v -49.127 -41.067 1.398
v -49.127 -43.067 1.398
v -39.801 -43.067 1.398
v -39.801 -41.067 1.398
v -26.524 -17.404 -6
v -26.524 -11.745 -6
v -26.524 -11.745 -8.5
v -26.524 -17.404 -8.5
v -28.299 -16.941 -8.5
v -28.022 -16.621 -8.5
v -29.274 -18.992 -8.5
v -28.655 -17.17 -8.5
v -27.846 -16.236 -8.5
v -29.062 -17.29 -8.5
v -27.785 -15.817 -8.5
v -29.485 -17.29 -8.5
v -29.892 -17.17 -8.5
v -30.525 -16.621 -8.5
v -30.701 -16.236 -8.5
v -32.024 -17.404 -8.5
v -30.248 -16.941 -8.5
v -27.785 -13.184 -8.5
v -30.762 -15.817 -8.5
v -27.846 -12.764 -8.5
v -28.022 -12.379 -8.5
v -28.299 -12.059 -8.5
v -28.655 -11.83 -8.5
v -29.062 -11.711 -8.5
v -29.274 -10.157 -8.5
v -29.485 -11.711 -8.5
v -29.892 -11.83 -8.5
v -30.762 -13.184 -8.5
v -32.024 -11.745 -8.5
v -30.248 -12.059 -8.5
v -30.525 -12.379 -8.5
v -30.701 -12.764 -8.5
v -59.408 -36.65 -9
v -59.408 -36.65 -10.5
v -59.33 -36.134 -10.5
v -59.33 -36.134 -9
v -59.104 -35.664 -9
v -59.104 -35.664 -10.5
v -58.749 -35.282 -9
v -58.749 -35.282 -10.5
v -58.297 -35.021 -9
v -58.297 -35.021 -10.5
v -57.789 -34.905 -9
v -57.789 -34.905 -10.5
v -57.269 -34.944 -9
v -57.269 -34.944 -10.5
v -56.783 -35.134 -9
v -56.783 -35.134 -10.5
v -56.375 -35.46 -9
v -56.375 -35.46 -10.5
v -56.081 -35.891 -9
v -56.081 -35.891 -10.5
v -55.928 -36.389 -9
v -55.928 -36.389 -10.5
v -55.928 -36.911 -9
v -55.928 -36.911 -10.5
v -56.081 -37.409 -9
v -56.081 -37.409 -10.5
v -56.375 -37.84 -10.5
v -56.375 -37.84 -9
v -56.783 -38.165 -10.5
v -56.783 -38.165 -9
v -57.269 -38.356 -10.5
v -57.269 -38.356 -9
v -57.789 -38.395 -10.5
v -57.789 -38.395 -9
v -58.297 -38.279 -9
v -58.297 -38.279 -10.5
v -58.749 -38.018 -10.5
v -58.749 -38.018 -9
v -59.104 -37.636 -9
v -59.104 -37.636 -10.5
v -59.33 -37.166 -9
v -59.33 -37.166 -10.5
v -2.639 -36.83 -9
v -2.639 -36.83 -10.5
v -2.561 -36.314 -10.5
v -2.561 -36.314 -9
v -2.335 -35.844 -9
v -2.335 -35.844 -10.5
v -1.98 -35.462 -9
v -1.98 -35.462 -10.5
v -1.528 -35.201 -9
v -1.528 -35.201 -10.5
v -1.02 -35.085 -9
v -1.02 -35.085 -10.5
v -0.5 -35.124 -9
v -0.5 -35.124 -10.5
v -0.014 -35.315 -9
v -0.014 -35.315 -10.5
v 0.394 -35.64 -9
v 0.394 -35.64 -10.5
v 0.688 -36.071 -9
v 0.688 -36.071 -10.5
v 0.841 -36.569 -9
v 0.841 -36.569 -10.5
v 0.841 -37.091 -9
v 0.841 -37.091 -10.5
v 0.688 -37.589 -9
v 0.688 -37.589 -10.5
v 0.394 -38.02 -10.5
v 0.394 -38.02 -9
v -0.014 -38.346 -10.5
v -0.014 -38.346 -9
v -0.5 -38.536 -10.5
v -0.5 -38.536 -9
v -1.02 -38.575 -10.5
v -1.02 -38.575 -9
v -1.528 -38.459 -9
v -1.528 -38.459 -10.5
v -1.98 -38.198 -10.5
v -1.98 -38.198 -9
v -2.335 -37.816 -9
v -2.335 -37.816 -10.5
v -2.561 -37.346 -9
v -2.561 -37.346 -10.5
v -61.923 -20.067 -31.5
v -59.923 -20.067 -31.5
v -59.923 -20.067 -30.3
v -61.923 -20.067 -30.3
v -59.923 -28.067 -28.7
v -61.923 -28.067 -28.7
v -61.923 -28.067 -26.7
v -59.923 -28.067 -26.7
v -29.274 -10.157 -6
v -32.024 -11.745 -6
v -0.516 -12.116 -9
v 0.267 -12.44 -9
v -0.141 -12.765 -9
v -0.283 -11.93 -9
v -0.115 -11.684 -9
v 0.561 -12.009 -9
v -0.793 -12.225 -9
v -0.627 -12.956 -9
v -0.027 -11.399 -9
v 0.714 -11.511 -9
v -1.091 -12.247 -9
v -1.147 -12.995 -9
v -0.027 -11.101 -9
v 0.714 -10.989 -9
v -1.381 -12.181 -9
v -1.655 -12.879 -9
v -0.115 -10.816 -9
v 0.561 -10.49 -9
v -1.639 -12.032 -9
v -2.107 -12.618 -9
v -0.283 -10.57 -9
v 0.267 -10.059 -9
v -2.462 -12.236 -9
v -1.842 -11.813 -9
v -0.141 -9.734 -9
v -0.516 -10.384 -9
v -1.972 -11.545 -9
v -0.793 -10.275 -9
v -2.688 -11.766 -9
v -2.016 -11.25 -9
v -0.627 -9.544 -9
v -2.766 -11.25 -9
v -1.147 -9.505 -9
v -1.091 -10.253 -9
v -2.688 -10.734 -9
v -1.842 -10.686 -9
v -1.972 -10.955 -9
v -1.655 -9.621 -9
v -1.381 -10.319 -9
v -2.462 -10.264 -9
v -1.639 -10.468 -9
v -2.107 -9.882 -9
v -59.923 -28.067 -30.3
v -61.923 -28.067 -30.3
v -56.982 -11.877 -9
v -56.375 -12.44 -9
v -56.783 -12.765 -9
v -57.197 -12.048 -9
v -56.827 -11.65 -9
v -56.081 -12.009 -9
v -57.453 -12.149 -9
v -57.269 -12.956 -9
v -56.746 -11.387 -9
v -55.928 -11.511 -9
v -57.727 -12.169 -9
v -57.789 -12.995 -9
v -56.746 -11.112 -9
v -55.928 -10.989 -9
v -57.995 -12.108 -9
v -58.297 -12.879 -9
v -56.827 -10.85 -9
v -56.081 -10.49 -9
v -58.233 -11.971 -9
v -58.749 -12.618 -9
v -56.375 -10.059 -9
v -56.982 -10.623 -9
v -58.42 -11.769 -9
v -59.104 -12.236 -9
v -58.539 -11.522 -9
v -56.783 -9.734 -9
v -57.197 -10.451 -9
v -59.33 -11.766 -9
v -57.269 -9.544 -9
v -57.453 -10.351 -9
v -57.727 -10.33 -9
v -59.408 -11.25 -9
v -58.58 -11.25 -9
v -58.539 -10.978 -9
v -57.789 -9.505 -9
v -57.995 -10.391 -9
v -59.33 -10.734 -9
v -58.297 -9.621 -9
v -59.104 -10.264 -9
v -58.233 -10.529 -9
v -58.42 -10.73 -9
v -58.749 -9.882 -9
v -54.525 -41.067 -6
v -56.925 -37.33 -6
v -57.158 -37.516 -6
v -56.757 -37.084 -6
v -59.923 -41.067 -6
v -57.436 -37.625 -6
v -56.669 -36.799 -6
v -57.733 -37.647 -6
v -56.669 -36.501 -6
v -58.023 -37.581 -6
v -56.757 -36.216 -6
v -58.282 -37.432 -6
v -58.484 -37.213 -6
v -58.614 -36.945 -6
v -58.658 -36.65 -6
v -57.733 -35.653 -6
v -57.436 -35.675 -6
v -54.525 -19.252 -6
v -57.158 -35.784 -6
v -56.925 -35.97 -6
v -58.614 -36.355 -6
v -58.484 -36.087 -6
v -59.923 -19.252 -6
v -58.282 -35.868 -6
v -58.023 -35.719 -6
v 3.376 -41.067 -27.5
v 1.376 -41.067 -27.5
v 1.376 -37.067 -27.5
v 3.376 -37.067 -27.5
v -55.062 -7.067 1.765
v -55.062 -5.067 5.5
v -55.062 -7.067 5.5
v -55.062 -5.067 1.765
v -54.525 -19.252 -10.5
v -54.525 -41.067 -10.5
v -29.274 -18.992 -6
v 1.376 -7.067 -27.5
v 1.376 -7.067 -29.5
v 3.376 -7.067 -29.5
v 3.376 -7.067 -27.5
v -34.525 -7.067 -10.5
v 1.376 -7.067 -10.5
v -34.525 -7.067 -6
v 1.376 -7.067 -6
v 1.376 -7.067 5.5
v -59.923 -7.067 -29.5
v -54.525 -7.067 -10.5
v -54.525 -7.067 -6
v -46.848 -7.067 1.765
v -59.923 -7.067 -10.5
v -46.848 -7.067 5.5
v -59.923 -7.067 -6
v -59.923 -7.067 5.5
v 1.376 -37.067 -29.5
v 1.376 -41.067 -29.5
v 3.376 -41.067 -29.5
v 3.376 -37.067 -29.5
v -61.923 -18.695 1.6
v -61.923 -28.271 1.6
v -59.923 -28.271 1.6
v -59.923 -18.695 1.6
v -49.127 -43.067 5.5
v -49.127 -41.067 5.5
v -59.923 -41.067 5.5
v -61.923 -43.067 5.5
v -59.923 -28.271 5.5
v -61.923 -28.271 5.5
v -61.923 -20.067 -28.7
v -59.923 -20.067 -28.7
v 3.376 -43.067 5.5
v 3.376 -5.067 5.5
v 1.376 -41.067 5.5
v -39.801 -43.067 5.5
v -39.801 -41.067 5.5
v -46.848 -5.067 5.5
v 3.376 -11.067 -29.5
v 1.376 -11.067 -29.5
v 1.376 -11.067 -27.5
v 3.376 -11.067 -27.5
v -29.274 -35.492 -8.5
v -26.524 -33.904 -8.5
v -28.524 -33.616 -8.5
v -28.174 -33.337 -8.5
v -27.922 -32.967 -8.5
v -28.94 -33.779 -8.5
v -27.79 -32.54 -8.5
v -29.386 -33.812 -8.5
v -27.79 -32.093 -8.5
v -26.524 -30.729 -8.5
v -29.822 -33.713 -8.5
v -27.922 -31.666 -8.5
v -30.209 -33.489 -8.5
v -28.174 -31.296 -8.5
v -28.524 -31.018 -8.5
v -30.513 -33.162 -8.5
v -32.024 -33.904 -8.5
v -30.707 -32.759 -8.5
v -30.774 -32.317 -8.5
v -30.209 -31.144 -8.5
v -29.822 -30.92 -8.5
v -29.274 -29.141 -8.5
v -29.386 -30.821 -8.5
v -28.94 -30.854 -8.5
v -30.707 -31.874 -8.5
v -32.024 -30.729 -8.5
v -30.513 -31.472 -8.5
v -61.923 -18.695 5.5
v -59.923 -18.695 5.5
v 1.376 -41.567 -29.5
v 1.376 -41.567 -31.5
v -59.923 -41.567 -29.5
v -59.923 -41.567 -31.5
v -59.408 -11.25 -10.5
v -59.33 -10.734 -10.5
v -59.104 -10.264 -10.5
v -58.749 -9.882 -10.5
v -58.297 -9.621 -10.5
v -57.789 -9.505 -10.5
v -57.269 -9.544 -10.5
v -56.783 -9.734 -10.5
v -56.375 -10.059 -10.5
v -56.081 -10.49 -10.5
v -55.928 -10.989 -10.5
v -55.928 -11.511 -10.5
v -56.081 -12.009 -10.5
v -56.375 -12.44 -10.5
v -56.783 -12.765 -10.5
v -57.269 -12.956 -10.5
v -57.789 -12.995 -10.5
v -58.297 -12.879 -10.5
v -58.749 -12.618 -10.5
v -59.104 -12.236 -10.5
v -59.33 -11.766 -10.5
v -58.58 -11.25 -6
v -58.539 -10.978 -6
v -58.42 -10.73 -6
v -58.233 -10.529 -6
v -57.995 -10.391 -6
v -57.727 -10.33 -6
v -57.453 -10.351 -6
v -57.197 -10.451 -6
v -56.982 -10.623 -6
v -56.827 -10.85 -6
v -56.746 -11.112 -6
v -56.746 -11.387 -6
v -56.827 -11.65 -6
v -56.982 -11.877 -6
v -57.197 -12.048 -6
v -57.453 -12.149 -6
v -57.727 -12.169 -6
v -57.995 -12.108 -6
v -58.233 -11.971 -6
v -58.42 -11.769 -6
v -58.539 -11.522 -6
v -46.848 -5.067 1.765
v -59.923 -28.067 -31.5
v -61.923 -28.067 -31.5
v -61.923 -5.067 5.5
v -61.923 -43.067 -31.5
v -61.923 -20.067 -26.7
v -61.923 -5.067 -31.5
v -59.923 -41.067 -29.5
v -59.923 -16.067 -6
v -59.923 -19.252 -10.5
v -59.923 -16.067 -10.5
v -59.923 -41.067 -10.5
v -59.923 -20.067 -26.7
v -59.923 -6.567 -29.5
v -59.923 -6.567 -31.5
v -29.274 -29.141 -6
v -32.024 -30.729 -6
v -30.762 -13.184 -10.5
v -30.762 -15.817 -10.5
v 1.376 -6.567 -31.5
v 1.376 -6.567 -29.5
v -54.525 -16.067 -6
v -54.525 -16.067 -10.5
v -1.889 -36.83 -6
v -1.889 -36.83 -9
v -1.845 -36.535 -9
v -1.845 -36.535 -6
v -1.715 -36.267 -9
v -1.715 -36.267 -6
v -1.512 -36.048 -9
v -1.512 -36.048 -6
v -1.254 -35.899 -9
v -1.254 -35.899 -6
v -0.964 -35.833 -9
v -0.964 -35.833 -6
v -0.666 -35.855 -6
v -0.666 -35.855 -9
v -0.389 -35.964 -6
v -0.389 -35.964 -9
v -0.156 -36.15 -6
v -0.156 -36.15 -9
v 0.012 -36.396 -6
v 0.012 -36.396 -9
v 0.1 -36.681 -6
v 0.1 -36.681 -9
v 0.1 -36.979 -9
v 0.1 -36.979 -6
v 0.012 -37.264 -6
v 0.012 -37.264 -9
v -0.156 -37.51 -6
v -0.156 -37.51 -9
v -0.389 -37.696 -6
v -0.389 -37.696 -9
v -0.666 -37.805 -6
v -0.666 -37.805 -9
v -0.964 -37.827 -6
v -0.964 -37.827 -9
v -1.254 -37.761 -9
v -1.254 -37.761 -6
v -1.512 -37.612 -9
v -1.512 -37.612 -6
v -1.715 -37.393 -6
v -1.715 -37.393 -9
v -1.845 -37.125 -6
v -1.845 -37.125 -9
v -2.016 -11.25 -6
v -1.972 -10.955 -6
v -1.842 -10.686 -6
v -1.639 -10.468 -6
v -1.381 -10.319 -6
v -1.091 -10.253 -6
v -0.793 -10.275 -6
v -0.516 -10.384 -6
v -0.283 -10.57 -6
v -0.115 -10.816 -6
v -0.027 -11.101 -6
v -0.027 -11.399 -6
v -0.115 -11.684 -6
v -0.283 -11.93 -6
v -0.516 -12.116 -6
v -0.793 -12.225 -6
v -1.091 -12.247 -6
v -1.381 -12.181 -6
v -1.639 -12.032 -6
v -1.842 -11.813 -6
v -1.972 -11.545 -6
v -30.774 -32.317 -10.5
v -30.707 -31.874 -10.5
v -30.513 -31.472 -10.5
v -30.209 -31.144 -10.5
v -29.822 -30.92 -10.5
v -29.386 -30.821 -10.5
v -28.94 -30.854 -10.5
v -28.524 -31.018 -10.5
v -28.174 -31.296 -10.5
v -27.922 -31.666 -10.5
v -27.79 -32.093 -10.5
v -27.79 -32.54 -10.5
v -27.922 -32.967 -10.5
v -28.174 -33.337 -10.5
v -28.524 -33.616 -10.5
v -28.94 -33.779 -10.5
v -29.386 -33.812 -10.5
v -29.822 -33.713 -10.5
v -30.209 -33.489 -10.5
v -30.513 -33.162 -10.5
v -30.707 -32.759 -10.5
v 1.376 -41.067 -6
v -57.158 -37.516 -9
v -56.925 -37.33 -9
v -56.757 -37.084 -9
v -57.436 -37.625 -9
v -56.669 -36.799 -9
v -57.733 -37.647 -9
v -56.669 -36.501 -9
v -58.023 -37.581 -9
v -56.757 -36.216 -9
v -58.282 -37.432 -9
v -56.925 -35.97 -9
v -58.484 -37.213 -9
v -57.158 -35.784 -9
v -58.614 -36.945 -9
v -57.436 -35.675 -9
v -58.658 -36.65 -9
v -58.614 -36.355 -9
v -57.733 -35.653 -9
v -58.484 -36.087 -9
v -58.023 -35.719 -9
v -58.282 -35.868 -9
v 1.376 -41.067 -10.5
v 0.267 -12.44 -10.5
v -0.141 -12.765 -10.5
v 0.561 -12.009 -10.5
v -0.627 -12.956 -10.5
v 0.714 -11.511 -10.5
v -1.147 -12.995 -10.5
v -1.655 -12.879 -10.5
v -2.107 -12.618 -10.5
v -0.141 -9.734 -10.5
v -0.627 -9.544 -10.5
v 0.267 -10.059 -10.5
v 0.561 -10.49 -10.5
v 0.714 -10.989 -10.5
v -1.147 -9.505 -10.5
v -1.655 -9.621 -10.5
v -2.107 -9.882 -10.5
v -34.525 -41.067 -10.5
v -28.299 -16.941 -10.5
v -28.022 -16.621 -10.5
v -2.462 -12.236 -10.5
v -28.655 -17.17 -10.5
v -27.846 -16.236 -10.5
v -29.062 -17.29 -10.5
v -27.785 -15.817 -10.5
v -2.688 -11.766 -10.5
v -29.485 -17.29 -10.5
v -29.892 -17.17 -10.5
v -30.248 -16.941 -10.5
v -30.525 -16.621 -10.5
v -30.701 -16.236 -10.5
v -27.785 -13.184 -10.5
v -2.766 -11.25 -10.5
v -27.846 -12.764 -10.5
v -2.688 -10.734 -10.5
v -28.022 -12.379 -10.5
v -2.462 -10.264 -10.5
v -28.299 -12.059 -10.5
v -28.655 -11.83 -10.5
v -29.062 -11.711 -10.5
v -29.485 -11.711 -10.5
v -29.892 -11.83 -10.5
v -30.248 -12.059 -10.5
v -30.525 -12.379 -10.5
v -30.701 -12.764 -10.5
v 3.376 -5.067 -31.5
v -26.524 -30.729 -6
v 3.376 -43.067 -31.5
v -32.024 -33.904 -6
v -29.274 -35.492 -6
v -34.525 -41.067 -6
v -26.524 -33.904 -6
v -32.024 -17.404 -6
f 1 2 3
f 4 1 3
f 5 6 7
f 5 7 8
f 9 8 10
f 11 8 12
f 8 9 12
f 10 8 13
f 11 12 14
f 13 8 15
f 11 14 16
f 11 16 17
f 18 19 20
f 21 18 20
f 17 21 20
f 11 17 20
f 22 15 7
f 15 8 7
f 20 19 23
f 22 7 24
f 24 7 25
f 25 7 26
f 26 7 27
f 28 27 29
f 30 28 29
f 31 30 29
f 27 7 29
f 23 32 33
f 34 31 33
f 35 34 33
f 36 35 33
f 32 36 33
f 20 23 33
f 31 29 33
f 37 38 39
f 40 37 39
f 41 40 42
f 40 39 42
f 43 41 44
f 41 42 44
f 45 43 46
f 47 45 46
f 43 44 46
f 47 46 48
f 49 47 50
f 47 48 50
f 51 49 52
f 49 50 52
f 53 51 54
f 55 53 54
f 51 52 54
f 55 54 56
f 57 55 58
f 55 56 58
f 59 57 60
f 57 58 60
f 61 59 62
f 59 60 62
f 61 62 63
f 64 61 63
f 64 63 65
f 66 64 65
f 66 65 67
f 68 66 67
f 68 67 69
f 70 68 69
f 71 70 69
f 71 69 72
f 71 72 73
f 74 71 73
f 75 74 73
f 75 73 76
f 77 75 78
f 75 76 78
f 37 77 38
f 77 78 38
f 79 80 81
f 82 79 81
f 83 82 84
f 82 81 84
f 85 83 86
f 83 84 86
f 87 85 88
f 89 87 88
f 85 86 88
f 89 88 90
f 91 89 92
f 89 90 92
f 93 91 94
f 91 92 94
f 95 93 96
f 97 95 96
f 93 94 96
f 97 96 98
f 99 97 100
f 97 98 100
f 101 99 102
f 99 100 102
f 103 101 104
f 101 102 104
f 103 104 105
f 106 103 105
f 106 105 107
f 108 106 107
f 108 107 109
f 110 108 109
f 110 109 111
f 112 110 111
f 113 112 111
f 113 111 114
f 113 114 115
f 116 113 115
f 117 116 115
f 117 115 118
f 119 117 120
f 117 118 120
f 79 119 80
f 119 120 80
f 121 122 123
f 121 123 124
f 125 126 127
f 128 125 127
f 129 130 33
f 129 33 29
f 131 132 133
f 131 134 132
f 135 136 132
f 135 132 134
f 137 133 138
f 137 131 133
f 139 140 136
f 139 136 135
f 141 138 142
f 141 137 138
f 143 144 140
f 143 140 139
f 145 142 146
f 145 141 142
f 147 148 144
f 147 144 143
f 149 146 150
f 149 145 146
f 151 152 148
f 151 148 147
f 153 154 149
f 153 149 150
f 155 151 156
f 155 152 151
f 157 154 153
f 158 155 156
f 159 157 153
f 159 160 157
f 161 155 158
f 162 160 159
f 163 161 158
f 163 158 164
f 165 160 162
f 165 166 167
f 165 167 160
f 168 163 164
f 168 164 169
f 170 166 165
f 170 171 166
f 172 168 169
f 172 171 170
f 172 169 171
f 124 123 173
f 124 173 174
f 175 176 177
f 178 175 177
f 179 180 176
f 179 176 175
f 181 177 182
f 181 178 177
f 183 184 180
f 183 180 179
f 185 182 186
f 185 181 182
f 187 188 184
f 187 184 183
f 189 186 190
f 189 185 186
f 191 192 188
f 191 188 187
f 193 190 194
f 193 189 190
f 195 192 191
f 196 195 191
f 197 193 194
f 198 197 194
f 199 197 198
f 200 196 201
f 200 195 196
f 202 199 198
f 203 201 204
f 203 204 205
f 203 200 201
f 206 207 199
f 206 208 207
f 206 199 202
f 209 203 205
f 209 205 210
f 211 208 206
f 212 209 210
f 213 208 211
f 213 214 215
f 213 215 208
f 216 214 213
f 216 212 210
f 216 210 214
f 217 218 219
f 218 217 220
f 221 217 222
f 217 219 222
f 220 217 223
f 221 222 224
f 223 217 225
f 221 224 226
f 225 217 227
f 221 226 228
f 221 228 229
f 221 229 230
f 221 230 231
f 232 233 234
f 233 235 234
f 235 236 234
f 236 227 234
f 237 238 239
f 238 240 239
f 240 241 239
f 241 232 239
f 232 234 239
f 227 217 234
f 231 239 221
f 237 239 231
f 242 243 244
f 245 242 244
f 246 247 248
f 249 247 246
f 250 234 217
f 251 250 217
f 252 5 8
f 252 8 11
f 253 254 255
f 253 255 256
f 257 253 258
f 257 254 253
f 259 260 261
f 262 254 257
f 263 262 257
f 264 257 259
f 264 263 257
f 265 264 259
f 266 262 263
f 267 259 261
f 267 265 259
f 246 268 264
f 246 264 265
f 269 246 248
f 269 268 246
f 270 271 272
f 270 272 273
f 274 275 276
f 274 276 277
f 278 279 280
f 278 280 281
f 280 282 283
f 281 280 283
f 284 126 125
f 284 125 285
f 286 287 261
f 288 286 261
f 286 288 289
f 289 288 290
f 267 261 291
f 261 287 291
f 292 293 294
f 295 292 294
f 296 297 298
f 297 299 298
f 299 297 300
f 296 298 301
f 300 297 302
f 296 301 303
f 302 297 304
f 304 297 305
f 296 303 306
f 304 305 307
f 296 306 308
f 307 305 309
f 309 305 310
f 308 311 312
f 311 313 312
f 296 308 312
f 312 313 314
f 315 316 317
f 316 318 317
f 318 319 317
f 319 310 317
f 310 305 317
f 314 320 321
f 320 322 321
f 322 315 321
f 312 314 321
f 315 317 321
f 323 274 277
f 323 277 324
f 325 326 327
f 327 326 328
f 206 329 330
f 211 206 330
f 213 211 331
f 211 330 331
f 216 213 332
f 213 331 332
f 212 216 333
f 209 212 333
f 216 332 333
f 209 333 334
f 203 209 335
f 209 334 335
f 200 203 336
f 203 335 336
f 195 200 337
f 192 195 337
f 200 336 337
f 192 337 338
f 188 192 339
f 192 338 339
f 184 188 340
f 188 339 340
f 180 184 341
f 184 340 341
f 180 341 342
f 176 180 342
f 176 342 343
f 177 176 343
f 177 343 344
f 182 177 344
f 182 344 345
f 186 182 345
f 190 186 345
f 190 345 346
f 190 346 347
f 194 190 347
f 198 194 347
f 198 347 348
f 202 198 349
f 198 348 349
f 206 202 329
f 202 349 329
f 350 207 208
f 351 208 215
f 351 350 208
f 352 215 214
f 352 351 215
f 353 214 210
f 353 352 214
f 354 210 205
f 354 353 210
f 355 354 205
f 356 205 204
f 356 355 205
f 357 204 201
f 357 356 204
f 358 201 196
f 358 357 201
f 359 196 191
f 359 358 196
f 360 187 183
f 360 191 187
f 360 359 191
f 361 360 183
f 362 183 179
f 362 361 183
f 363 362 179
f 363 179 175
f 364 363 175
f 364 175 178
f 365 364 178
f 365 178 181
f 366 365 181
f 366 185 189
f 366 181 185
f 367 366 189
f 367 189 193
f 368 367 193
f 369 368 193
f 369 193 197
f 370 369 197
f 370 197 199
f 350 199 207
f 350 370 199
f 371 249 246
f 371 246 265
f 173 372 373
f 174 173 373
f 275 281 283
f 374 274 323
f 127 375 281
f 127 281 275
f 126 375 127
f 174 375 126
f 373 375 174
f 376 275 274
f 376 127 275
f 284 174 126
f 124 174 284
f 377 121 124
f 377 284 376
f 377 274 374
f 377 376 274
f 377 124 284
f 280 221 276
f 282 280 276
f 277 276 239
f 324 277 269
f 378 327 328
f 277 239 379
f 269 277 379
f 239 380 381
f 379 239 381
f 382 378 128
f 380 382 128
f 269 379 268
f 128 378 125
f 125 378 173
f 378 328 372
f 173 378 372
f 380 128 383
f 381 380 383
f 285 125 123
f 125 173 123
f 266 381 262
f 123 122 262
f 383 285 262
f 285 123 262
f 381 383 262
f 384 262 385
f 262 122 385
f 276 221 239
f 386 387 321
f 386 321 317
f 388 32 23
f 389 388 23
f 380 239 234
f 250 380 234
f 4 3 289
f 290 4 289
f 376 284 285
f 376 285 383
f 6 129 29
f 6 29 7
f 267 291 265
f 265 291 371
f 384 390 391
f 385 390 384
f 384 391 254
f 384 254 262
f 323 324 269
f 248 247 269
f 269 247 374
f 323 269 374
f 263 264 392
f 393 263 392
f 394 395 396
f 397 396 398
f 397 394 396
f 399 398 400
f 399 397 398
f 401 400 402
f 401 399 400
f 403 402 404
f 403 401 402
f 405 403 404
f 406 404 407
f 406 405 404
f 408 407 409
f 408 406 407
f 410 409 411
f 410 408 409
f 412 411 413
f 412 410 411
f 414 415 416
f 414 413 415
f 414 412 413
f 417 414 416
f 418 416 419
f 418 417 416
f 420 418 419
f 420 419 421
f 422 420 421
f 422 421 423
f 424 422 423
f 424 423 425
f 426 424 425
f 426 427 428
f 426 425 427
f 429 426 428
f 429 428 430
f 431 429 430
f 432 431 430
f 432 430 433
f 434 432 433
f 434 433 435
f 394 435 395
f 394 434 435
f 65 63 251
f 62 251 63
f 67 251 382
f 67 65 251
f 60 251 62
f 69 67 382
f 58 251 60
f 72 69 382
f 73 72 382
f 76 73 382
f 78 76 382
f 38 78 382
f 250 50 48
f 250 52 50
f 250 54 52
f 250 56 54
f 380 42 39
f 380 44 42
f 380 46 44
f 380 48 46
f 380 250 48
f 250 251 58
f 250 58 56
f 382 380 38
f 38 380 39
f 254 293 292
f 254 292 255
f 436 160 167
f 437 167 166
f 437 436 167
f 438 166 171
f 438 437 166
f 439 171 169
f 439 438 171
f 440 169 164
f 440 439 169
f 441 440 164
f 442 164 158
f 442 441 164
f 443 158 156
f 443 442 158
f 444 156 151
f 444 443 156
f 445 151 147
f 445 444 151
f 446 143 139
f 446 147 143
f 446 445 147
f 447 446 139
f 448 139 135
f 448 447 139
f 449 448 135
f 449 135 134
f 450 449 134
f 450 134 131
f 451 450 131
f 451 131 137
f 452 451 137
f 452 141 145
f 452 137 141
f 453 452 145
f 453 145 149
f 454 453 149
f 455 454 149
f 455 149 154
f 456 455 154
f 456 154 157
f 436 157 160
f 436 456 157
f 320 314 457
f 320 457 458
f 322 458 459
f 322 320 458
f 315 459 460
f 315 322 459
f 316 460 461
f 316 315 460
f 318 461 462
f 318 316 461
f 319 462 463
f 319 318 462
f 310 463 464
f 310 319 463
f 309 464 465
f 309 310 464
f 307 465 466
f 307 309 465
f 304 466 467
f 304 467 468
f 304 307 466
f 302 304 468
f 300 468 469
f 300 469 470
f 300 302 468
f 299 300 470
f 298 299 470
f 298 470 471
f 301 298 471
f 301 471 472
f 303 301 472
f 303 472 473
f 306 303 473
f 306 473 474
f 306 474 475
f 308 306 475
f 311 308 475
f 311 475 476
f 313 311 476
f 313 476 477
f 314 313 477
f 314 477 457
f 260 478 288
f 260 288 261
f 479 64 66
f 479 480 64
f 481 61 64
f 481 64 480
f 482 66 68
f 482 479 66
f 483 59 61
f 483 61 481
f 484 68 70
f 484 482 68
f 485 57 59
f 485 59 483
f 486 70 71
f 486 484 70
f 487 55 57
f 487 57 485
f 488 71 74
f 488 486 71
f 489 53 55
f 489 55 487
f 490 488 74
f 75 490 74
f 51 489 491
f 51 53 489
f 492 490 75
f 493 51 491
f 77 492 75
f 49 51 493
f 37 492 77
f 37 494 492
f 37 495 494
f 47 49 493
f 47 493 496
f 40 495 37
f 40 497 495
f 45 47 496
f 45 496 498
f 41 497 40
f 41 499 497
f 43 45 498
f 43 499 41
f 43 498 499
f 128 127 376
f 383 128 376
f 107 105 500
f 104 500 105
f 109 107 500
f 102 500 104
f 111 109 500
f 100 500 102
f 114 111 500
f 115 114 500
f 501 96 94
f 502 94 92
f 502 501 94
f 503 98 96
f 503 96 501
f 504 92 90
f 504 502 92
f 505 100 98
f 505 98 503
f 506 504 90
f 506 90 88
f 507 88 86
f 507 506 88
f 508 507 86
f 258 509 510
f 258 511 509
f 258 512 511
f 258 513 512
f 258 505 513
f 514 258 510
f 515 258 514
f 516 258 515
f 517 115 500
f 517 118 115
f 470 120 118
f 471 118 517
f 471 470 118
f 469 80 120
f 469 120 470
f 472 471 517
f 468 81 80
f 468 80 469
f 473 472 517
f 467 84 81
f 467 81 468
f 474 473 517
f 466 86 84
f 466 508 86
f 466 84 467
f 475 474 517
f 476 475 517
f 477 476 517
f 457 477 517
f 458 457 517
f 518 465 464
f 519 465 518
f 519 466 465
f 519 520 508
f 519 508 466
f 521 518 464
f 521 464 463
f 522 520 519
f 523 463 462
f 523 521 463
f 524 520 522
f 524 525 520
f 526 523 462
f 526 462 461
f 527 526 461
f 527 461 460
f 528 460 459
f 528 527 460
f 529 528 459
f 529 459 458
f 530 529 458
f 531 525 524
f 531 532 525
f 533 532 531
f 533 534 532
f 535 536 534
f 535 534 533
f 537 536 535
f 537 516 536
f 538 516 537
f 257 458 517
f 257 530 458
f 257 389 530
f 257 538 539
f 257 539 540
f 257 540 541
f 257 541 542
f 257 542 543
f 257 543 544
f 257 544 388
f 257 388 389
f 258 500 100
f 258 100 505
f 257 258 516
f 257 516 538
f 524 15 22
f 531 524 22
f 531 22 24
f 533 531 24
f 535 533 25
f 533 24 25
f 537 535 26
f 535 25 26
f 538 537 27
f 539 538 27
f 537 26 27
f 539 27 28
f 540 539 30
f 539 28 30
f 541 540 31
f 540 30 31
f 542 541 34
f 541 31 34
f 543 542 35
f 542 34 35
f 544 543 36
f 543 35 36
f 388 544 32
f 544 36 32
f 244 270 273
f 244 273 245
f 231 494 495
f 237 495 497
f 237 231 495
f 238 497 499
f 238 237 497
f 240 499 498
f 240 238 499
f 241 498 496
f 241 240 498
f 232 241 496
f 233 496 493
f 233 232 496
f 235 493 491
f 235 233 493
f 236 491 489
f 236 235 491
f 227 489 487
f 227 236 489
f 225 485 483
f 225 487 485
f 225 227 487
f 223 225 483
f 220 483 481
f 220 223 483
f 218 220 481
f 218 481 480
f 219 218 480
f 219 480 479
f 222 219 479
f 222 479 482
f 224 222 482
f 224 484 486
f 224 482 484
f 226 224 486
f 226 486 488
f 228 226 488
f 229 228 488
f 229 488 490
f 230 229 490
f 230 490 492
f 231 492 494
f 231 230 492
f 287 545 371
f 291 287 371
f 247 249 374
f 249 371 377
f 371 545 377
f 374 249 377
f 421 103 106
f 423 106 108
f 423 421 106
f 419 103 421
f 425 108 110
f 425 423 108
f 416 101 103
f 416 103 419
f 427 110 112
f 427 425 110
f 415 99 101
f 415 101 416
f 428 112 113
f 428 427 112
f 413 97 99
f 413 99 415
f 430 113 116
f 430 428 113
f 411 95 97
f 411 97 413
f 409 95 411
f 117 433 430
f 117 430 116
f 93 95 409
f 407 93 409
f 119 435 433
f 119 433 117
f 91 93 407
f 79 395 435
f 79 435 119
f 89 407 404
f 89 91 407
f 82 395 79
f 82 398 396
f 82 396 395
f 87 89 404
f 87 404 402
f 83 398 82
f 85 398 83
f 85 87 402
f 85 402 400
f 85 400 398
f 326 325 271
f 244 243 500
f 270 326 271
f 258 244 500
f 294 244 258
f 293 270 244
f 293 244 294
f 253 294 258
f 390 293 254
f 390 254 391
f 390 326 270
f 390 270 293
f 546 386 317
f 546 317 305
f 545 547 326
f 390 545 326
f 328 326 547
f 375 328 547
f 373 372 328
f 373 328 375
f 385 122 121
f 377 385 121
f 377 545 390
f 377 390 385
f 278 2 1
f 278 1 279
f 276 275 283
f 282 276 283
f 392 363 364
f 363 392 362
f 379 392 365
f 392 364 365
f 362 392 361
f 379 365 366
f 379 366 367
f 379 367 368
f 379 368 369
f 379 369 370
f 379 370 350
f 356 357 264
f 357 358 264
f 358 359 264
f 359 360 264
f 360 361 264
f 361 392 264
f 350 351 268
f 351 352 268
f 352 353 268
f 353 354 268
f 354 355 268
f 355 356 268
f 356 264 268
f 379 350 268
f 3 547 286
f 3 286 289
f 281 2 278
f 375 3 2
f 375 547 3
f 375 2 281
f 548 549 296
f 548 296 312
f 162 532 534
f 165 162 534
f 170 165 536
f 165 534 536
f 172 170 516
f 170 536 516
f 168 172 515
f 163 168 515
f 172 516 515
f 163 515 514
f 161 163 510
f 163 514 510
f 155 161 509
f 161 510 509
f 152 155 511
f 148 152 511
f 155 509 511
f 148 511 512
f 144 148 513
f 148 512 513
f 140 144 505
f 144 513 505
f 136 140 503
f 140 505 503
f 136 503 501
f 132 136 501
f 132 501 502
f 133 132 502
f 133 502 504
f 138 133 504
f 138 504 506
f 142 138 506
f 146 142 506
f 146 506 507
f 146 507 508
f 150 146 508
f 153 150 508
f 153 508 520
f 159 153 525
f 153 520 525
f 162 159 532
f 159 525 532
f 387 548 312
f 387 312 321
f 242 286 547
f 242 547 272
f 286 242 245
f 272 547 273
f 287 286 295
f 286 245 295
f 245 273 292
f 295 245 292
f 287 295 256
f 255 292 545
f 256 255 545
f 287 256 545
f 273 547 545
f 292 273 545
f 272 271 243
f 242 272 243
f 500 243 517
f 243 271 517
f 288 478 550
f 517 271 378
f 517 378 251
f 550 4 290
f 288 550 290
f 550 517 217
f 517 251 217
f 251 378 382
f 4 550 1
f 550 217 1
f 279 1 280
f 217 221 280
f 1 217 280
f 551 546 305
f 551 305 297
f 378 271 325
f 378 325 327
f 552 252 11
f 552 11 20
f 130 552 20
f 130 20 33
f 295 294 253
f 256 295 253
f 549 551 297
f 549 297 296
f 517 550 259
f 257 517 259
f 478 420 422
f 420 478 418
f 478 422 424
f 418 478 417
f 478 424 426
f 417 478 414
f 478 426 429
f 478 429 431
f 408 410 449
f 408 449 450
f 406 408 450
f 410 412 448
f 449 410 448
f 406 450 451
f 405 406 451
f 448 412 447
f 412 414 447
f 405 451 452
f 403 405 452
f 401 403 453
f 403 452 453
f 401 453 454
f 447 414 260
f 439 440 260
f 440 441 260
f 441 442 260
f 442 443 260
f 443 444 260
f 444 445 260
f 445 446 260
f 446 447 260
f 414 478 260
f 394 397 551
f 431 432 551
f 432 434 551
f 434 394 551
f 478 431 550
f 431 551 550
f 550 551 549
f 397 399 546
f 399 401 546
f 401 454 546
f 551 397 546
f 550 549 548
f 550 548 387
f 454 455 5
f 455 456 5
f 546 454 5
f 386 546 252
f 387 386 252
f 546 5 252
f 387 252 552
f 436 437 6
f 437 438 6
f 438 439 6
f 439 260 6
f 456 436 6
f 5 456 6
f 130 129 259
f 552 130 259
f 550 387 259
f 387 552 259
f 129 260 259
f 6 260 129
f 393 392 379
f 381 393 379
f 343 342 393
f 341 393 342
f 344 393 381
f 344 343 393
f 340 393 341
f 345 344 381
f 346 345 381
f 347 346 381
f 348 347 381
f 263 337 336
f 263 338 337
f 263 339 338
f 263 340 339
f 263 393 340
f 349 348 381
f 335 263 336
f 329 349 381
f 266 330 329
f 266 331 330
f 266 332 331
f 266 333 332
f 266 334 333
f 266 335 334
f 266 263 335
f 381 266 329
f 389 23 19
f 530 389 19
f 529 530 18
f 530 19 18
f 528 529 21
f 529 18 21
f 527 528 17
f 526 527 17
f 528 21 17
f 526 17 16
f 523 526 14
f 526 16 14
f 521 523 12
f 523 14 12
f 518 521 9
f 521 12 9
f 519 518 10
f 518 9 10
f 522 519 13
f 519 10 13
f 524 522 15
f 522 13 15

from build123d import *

# Parameters (mm, degrees)
SKETCH_2_W           = 65.2997206
SKETCH_2_H           = 38
SKETCH_2_R           = 1.00000254
SKETCH_2_R_2         = 0.922218434
SKETCH_2_R_3         = 1.5
EXTRUDE_2_DEPTH      = 4.5
SKETCH_3_R           = 1.5
CUT_EXTRUDE_2_DEPTH  = 2.5
SKETCH_5_W           = 65.2997206
SKETCH_5_H           = 38
SKETCH_5_W_2         = 61.2997206
SKETCH_5_H_2         = 34
EXTRUDE_3_DEPTH      = 21
EXTRUDE_3_DEPTH_BACK = 16
SKETCH_7_W           = 8.214112973
SKETCH_7_H           = 3.795011114
CUT_EXTRUDE_4_DEPTH  = 3
SKETCH_8_W           = 4
SKETCH_8_H           = 9.575559499
CUT_EXTRUDE_5_DEPTH  = 3
SKETCH_9_W           = 9.326303795
SKETCH_9_H           = 4.202278939
CUT_EXTRUDE_6_DEPTH  = 3
CUT_EXTRUDE_7_DEPTH  = 10
SKETCH_15_R          = 1.75
CUT_EXTRUDE_8_DEPTH  = 1.5
SKETCH_18_W          = 61.2997206
SKETCH_18_H          = 35
CUT_EXTRUDE_9_DEPTH  = 2
SKETCH_19_W          = 2
SKETCH_19_H          = 4
CUT_EXTRUDE_10_DEPTH = 2
SKETCH_20_W          = 2
SKETCH_20_H          = 8
CUT_EXTRUDE_11_DEPTH = 1.2
SKETCH_21_W          = 2
SKETCH_21_H          = 8
CUT_EXTRUDE_12_DEPTH = 2


with BuildPart() as part:
    # 草图2 → 凸台-拉伸2 (new body)
    with BuildSketch(Plane(origin=(0, 0, -6), x_dir=(-1, 0, 0), z_dir=(0, 0, -1))):
        with Locations((29.273558547, -24.066548133)):
            Rectangle(SKETCH_2_W, SKETCH_2_H)
        with Locations((1.016002032, -11.24978156)):
            Circle(SKETCH_2_R, mode=Mode.SUBTRACT)
        with Locations((0.889001778, -36.83007366)):
            Circle(SKETCH_2_R, mode=Mode.SUBTRACT)
        with Locations((57.658115316, -36.64983236)):
            Circle(SKETCH_2_R, mode=Mode.SUBTRACT)
        with Locations((57.658115316, -11.24978156)):
            Circle(SKETCH_2_R_2, mode=Mode.SUBTRACT)
        with Locations((29.273558547, -32.316548133)):
            Circle(SKETCH_2_R_3, mode=Mode.SUBTRACT)
        with BuildLine():
            Line((27.785407033, -15.816548133), (27.785407033, -13.183619987))
            ThreePointArc((27.785407033, -13.183619987), (29.273558547, -11.695468472), (30.761710061, -13.183619987))
            Line((30.761710061, -13.183619987), (30.761710061, -15.816548133))
            ThreePointArc((30.761710061, -15.816548133), (29.273558547, -17.304699647), (27.785407033, -15.816548133))
        make_face(mode=Mode.SUBTRACT)
    extrude(amount=EXTRUDE_2_DEPTH)

    # 草图3 → 切除-拉伸2 (cut)
    with BuildSketch(Plane(origin=(0, 0, -6), x_dir=(-1, 0, 0), z_dir=(0, 0, -1))):
        Polygon((29.273558547, -18.991974614), (32.023558547, -17.404261373), (32.023558547, -14.920341582), (32.023558547, -14.228834893), (32.023558547, -11.744915102), (29.273558547, -10.157201862), (26.523558547, -11.744915102), (26.523558547, -14.228834893), (26.523558547, -14.920341582), (26.523558547, -17.404261373), align=None)
        with BuildLine():
            ThreePointArc((30.761710061, -15.816548133), (29.273558547, -17.304699647), (27.785407033, -15.816548133))
            Line((27.785407033, -15.816548133), (27.785407033, -13.183619987))
            ThreePointArc((27.785407033, -13.183619987), (29.273558547, -11.695468472), (30.761710061, -13.183619987))
            Line((30.761710061, -13.183619987), (30.761710061, -15.816548133))
        make_face(mode=Mode.SUBTRACT)
        Polygon((26.523558547, -30.728834893), (26.523558547, -33.904261373), (29.273558547, -35.491974614), (32.023558547, -33.904261373), (32.023558547, -30.728834893), (29.273558547, -29.141121653), align=None)
        with Locations((29.273558547, -32.316548133)):
            Circle(SKETCH_3_R, mode=Mode.SUBTRACT)
    extrude(amount=CUT_EXTRUDE_2_DEPTH, mode=Mode.SUBTRACT)

    # 草图5 → 凸台-拉伸3 (add, two sides)
    with BuildSketch(Plane(origin=(0, 0, -10.5), x_dir=(-1, 0, 0), z_dir=(0, 0, -1))) as extrude_3_sk:
        with Locations((29.273558547, -24.066548133)):
            Rectangle(SKETCH_5_W, SKETCH_5_H)
        with Locations((29.273558547, -24.066548133)):
            Rectangle(SKETCH_5_W_2, SKETCH_5_H_2, mode=Mode.SUBTRACT)
    extrude(amount=EXTRUDE_3_DEPTH)
    extrude(extrude_3_sk.sketch, amount=-EXTRUDE_3_DEPTH_BACK)

    # 草图7 → 切除-拉伸4 (cut)
    with BuildSketch(Plane(origin=(0, -5.066548133, 0), x_dir=(1, 0, 0), z_dir=(0, 1, 0))):
        with Locations((-50.955145133, -3.662545243)):
            Rectangle(SKETCH_7_W, SKETCH_7_H)
    extrude(amount=-CUT_EXTRUDE_4_DEPTH, mode=Mode.SUBTRACT)

    # 草图8 → 切除-拉伸5 (cut)
    with BuildSketch(Plane.ZY.offset(61.923418847)):
        with Locations((3.6000508, -23.483057223)):
            Rectangle(SKETCH_8_W, SKETCH_8_H)
    extrude(amount=-CUT_EXTRUDE_5_DEPTH, mode=Mode.SUBTRACT)

    # 草图9 → 切除-拉伸6 (cut)
    with BuildSketch(Plane.XZ.offset(43.066548133)):
        with Locations((-44.464129124, 3.49891133)):
            Rectangle(SKETCH_9_W, SKETCH_9_H)
    extrude(amount=-CUT_EXTRUDE_6_DEPTH, mode=Mode.SUBTRACT)

    # 草图13 → 切除-拉伸7 (cut)
    with BuildSketch(Plane.XY.offset(-6)):
        Polygon((-59.923418847, -16.066514367), (-59.923418847, -19.252115931), (-54.525349934, -19.252115931), (-54.525349934, -41.066548133), (-34.525349934, -41.066548133), (-34.525349934, -7.066548133), (-54.525349934, -7.066548133), (-54.525349934, -12.880912803), (-54.525349934, -16.066514367), align=None)
    extrude(amount=-CUT_EXTRUDE_7_DEPTH, mode=Mode.SUBTRACT)

    # 草图15 → 切除-拉伸8 (cut)
    with BuildSketch(Plane(origin=(0, 0, -10.5), x_dir=(-1, 0, 0), z_dir=(0, 0, -1))):
        with Locations((1.016002032, -11.24978156)):
            Circle(SKETCH_15_R)
        with Locations((57.658115316, -11.24978156)):
            Circle(SKETCH_15_R)
        with Locations((0.889001778, -36.83007366)):
            Circle(SKETCH_15_R)
        with Locations((57.658115316, -36.64983236)):
            Circle(SKETCH_15_R)
    extrude(amount=-CUT_EXTRUDE_8_DEPTH, mode=Mode.SUBTRACT)

    # 草图18 → 切除-拉伸9 (cut)
    with BuildSketch(Plane(origin=(0, 0, -31.5), x_dir=(-1, 0, 0), z_dir=(0, 0, -1))):
        with Locations((29.273558547, -24.066548133)):
            Rectangle(SKETCH_18_W, SKETCH_18_H)
    extrude(amount=-CUT_EXTRUDE_9_DEPTH, mode=Mode.SUBTRACT)

    # 草图19 → 切除-拉伸10 (cut)
    with BuildSketch(Plane.ZY.offset(-1.376301753)):
        with Locations((-28.5, -9.066548133)):
            Rectangle(SKETCH_19_W, SKETCH_19_H)
        with Locations((-28.5, -39.066548133)):
            Rectangle(SKETCH_19_W, SKETCH_19_H)
    extrude(amount=-CUT_EXTRUDE_10_DEPTH, mode=Mode.SUBTRACT)

    # 草图20 → 切除-拉伸11 (cut)
    with BuildSketch(Plane(origin=(0, 0, -31.5), x_dir=(-1, 0, 0), z_dir=(0, 0, -1))):
        with Locations((60.923418847, -24.066548133)):
            Rectangle(SKETCH_20_W, SKETCH_20_H)
    extrude(amount=-CUT_EXTRUDE_11_DEPTH, mode=Mode.SUBTRACT)

    # 草图21 → 切除-拉伸12 (cut)
    with BuildSketch(Plane.ZY.offset(61.923418847)):
        with Locations((-27.7, -24.066548133)):
            Rectangle(SKETCH_21_W, SKETCH_21_H)
    extrude(amount=-CUT_EXTRUDE_12_DEPTH, mode=Mode.SUBTRACT)


solid = part.part
